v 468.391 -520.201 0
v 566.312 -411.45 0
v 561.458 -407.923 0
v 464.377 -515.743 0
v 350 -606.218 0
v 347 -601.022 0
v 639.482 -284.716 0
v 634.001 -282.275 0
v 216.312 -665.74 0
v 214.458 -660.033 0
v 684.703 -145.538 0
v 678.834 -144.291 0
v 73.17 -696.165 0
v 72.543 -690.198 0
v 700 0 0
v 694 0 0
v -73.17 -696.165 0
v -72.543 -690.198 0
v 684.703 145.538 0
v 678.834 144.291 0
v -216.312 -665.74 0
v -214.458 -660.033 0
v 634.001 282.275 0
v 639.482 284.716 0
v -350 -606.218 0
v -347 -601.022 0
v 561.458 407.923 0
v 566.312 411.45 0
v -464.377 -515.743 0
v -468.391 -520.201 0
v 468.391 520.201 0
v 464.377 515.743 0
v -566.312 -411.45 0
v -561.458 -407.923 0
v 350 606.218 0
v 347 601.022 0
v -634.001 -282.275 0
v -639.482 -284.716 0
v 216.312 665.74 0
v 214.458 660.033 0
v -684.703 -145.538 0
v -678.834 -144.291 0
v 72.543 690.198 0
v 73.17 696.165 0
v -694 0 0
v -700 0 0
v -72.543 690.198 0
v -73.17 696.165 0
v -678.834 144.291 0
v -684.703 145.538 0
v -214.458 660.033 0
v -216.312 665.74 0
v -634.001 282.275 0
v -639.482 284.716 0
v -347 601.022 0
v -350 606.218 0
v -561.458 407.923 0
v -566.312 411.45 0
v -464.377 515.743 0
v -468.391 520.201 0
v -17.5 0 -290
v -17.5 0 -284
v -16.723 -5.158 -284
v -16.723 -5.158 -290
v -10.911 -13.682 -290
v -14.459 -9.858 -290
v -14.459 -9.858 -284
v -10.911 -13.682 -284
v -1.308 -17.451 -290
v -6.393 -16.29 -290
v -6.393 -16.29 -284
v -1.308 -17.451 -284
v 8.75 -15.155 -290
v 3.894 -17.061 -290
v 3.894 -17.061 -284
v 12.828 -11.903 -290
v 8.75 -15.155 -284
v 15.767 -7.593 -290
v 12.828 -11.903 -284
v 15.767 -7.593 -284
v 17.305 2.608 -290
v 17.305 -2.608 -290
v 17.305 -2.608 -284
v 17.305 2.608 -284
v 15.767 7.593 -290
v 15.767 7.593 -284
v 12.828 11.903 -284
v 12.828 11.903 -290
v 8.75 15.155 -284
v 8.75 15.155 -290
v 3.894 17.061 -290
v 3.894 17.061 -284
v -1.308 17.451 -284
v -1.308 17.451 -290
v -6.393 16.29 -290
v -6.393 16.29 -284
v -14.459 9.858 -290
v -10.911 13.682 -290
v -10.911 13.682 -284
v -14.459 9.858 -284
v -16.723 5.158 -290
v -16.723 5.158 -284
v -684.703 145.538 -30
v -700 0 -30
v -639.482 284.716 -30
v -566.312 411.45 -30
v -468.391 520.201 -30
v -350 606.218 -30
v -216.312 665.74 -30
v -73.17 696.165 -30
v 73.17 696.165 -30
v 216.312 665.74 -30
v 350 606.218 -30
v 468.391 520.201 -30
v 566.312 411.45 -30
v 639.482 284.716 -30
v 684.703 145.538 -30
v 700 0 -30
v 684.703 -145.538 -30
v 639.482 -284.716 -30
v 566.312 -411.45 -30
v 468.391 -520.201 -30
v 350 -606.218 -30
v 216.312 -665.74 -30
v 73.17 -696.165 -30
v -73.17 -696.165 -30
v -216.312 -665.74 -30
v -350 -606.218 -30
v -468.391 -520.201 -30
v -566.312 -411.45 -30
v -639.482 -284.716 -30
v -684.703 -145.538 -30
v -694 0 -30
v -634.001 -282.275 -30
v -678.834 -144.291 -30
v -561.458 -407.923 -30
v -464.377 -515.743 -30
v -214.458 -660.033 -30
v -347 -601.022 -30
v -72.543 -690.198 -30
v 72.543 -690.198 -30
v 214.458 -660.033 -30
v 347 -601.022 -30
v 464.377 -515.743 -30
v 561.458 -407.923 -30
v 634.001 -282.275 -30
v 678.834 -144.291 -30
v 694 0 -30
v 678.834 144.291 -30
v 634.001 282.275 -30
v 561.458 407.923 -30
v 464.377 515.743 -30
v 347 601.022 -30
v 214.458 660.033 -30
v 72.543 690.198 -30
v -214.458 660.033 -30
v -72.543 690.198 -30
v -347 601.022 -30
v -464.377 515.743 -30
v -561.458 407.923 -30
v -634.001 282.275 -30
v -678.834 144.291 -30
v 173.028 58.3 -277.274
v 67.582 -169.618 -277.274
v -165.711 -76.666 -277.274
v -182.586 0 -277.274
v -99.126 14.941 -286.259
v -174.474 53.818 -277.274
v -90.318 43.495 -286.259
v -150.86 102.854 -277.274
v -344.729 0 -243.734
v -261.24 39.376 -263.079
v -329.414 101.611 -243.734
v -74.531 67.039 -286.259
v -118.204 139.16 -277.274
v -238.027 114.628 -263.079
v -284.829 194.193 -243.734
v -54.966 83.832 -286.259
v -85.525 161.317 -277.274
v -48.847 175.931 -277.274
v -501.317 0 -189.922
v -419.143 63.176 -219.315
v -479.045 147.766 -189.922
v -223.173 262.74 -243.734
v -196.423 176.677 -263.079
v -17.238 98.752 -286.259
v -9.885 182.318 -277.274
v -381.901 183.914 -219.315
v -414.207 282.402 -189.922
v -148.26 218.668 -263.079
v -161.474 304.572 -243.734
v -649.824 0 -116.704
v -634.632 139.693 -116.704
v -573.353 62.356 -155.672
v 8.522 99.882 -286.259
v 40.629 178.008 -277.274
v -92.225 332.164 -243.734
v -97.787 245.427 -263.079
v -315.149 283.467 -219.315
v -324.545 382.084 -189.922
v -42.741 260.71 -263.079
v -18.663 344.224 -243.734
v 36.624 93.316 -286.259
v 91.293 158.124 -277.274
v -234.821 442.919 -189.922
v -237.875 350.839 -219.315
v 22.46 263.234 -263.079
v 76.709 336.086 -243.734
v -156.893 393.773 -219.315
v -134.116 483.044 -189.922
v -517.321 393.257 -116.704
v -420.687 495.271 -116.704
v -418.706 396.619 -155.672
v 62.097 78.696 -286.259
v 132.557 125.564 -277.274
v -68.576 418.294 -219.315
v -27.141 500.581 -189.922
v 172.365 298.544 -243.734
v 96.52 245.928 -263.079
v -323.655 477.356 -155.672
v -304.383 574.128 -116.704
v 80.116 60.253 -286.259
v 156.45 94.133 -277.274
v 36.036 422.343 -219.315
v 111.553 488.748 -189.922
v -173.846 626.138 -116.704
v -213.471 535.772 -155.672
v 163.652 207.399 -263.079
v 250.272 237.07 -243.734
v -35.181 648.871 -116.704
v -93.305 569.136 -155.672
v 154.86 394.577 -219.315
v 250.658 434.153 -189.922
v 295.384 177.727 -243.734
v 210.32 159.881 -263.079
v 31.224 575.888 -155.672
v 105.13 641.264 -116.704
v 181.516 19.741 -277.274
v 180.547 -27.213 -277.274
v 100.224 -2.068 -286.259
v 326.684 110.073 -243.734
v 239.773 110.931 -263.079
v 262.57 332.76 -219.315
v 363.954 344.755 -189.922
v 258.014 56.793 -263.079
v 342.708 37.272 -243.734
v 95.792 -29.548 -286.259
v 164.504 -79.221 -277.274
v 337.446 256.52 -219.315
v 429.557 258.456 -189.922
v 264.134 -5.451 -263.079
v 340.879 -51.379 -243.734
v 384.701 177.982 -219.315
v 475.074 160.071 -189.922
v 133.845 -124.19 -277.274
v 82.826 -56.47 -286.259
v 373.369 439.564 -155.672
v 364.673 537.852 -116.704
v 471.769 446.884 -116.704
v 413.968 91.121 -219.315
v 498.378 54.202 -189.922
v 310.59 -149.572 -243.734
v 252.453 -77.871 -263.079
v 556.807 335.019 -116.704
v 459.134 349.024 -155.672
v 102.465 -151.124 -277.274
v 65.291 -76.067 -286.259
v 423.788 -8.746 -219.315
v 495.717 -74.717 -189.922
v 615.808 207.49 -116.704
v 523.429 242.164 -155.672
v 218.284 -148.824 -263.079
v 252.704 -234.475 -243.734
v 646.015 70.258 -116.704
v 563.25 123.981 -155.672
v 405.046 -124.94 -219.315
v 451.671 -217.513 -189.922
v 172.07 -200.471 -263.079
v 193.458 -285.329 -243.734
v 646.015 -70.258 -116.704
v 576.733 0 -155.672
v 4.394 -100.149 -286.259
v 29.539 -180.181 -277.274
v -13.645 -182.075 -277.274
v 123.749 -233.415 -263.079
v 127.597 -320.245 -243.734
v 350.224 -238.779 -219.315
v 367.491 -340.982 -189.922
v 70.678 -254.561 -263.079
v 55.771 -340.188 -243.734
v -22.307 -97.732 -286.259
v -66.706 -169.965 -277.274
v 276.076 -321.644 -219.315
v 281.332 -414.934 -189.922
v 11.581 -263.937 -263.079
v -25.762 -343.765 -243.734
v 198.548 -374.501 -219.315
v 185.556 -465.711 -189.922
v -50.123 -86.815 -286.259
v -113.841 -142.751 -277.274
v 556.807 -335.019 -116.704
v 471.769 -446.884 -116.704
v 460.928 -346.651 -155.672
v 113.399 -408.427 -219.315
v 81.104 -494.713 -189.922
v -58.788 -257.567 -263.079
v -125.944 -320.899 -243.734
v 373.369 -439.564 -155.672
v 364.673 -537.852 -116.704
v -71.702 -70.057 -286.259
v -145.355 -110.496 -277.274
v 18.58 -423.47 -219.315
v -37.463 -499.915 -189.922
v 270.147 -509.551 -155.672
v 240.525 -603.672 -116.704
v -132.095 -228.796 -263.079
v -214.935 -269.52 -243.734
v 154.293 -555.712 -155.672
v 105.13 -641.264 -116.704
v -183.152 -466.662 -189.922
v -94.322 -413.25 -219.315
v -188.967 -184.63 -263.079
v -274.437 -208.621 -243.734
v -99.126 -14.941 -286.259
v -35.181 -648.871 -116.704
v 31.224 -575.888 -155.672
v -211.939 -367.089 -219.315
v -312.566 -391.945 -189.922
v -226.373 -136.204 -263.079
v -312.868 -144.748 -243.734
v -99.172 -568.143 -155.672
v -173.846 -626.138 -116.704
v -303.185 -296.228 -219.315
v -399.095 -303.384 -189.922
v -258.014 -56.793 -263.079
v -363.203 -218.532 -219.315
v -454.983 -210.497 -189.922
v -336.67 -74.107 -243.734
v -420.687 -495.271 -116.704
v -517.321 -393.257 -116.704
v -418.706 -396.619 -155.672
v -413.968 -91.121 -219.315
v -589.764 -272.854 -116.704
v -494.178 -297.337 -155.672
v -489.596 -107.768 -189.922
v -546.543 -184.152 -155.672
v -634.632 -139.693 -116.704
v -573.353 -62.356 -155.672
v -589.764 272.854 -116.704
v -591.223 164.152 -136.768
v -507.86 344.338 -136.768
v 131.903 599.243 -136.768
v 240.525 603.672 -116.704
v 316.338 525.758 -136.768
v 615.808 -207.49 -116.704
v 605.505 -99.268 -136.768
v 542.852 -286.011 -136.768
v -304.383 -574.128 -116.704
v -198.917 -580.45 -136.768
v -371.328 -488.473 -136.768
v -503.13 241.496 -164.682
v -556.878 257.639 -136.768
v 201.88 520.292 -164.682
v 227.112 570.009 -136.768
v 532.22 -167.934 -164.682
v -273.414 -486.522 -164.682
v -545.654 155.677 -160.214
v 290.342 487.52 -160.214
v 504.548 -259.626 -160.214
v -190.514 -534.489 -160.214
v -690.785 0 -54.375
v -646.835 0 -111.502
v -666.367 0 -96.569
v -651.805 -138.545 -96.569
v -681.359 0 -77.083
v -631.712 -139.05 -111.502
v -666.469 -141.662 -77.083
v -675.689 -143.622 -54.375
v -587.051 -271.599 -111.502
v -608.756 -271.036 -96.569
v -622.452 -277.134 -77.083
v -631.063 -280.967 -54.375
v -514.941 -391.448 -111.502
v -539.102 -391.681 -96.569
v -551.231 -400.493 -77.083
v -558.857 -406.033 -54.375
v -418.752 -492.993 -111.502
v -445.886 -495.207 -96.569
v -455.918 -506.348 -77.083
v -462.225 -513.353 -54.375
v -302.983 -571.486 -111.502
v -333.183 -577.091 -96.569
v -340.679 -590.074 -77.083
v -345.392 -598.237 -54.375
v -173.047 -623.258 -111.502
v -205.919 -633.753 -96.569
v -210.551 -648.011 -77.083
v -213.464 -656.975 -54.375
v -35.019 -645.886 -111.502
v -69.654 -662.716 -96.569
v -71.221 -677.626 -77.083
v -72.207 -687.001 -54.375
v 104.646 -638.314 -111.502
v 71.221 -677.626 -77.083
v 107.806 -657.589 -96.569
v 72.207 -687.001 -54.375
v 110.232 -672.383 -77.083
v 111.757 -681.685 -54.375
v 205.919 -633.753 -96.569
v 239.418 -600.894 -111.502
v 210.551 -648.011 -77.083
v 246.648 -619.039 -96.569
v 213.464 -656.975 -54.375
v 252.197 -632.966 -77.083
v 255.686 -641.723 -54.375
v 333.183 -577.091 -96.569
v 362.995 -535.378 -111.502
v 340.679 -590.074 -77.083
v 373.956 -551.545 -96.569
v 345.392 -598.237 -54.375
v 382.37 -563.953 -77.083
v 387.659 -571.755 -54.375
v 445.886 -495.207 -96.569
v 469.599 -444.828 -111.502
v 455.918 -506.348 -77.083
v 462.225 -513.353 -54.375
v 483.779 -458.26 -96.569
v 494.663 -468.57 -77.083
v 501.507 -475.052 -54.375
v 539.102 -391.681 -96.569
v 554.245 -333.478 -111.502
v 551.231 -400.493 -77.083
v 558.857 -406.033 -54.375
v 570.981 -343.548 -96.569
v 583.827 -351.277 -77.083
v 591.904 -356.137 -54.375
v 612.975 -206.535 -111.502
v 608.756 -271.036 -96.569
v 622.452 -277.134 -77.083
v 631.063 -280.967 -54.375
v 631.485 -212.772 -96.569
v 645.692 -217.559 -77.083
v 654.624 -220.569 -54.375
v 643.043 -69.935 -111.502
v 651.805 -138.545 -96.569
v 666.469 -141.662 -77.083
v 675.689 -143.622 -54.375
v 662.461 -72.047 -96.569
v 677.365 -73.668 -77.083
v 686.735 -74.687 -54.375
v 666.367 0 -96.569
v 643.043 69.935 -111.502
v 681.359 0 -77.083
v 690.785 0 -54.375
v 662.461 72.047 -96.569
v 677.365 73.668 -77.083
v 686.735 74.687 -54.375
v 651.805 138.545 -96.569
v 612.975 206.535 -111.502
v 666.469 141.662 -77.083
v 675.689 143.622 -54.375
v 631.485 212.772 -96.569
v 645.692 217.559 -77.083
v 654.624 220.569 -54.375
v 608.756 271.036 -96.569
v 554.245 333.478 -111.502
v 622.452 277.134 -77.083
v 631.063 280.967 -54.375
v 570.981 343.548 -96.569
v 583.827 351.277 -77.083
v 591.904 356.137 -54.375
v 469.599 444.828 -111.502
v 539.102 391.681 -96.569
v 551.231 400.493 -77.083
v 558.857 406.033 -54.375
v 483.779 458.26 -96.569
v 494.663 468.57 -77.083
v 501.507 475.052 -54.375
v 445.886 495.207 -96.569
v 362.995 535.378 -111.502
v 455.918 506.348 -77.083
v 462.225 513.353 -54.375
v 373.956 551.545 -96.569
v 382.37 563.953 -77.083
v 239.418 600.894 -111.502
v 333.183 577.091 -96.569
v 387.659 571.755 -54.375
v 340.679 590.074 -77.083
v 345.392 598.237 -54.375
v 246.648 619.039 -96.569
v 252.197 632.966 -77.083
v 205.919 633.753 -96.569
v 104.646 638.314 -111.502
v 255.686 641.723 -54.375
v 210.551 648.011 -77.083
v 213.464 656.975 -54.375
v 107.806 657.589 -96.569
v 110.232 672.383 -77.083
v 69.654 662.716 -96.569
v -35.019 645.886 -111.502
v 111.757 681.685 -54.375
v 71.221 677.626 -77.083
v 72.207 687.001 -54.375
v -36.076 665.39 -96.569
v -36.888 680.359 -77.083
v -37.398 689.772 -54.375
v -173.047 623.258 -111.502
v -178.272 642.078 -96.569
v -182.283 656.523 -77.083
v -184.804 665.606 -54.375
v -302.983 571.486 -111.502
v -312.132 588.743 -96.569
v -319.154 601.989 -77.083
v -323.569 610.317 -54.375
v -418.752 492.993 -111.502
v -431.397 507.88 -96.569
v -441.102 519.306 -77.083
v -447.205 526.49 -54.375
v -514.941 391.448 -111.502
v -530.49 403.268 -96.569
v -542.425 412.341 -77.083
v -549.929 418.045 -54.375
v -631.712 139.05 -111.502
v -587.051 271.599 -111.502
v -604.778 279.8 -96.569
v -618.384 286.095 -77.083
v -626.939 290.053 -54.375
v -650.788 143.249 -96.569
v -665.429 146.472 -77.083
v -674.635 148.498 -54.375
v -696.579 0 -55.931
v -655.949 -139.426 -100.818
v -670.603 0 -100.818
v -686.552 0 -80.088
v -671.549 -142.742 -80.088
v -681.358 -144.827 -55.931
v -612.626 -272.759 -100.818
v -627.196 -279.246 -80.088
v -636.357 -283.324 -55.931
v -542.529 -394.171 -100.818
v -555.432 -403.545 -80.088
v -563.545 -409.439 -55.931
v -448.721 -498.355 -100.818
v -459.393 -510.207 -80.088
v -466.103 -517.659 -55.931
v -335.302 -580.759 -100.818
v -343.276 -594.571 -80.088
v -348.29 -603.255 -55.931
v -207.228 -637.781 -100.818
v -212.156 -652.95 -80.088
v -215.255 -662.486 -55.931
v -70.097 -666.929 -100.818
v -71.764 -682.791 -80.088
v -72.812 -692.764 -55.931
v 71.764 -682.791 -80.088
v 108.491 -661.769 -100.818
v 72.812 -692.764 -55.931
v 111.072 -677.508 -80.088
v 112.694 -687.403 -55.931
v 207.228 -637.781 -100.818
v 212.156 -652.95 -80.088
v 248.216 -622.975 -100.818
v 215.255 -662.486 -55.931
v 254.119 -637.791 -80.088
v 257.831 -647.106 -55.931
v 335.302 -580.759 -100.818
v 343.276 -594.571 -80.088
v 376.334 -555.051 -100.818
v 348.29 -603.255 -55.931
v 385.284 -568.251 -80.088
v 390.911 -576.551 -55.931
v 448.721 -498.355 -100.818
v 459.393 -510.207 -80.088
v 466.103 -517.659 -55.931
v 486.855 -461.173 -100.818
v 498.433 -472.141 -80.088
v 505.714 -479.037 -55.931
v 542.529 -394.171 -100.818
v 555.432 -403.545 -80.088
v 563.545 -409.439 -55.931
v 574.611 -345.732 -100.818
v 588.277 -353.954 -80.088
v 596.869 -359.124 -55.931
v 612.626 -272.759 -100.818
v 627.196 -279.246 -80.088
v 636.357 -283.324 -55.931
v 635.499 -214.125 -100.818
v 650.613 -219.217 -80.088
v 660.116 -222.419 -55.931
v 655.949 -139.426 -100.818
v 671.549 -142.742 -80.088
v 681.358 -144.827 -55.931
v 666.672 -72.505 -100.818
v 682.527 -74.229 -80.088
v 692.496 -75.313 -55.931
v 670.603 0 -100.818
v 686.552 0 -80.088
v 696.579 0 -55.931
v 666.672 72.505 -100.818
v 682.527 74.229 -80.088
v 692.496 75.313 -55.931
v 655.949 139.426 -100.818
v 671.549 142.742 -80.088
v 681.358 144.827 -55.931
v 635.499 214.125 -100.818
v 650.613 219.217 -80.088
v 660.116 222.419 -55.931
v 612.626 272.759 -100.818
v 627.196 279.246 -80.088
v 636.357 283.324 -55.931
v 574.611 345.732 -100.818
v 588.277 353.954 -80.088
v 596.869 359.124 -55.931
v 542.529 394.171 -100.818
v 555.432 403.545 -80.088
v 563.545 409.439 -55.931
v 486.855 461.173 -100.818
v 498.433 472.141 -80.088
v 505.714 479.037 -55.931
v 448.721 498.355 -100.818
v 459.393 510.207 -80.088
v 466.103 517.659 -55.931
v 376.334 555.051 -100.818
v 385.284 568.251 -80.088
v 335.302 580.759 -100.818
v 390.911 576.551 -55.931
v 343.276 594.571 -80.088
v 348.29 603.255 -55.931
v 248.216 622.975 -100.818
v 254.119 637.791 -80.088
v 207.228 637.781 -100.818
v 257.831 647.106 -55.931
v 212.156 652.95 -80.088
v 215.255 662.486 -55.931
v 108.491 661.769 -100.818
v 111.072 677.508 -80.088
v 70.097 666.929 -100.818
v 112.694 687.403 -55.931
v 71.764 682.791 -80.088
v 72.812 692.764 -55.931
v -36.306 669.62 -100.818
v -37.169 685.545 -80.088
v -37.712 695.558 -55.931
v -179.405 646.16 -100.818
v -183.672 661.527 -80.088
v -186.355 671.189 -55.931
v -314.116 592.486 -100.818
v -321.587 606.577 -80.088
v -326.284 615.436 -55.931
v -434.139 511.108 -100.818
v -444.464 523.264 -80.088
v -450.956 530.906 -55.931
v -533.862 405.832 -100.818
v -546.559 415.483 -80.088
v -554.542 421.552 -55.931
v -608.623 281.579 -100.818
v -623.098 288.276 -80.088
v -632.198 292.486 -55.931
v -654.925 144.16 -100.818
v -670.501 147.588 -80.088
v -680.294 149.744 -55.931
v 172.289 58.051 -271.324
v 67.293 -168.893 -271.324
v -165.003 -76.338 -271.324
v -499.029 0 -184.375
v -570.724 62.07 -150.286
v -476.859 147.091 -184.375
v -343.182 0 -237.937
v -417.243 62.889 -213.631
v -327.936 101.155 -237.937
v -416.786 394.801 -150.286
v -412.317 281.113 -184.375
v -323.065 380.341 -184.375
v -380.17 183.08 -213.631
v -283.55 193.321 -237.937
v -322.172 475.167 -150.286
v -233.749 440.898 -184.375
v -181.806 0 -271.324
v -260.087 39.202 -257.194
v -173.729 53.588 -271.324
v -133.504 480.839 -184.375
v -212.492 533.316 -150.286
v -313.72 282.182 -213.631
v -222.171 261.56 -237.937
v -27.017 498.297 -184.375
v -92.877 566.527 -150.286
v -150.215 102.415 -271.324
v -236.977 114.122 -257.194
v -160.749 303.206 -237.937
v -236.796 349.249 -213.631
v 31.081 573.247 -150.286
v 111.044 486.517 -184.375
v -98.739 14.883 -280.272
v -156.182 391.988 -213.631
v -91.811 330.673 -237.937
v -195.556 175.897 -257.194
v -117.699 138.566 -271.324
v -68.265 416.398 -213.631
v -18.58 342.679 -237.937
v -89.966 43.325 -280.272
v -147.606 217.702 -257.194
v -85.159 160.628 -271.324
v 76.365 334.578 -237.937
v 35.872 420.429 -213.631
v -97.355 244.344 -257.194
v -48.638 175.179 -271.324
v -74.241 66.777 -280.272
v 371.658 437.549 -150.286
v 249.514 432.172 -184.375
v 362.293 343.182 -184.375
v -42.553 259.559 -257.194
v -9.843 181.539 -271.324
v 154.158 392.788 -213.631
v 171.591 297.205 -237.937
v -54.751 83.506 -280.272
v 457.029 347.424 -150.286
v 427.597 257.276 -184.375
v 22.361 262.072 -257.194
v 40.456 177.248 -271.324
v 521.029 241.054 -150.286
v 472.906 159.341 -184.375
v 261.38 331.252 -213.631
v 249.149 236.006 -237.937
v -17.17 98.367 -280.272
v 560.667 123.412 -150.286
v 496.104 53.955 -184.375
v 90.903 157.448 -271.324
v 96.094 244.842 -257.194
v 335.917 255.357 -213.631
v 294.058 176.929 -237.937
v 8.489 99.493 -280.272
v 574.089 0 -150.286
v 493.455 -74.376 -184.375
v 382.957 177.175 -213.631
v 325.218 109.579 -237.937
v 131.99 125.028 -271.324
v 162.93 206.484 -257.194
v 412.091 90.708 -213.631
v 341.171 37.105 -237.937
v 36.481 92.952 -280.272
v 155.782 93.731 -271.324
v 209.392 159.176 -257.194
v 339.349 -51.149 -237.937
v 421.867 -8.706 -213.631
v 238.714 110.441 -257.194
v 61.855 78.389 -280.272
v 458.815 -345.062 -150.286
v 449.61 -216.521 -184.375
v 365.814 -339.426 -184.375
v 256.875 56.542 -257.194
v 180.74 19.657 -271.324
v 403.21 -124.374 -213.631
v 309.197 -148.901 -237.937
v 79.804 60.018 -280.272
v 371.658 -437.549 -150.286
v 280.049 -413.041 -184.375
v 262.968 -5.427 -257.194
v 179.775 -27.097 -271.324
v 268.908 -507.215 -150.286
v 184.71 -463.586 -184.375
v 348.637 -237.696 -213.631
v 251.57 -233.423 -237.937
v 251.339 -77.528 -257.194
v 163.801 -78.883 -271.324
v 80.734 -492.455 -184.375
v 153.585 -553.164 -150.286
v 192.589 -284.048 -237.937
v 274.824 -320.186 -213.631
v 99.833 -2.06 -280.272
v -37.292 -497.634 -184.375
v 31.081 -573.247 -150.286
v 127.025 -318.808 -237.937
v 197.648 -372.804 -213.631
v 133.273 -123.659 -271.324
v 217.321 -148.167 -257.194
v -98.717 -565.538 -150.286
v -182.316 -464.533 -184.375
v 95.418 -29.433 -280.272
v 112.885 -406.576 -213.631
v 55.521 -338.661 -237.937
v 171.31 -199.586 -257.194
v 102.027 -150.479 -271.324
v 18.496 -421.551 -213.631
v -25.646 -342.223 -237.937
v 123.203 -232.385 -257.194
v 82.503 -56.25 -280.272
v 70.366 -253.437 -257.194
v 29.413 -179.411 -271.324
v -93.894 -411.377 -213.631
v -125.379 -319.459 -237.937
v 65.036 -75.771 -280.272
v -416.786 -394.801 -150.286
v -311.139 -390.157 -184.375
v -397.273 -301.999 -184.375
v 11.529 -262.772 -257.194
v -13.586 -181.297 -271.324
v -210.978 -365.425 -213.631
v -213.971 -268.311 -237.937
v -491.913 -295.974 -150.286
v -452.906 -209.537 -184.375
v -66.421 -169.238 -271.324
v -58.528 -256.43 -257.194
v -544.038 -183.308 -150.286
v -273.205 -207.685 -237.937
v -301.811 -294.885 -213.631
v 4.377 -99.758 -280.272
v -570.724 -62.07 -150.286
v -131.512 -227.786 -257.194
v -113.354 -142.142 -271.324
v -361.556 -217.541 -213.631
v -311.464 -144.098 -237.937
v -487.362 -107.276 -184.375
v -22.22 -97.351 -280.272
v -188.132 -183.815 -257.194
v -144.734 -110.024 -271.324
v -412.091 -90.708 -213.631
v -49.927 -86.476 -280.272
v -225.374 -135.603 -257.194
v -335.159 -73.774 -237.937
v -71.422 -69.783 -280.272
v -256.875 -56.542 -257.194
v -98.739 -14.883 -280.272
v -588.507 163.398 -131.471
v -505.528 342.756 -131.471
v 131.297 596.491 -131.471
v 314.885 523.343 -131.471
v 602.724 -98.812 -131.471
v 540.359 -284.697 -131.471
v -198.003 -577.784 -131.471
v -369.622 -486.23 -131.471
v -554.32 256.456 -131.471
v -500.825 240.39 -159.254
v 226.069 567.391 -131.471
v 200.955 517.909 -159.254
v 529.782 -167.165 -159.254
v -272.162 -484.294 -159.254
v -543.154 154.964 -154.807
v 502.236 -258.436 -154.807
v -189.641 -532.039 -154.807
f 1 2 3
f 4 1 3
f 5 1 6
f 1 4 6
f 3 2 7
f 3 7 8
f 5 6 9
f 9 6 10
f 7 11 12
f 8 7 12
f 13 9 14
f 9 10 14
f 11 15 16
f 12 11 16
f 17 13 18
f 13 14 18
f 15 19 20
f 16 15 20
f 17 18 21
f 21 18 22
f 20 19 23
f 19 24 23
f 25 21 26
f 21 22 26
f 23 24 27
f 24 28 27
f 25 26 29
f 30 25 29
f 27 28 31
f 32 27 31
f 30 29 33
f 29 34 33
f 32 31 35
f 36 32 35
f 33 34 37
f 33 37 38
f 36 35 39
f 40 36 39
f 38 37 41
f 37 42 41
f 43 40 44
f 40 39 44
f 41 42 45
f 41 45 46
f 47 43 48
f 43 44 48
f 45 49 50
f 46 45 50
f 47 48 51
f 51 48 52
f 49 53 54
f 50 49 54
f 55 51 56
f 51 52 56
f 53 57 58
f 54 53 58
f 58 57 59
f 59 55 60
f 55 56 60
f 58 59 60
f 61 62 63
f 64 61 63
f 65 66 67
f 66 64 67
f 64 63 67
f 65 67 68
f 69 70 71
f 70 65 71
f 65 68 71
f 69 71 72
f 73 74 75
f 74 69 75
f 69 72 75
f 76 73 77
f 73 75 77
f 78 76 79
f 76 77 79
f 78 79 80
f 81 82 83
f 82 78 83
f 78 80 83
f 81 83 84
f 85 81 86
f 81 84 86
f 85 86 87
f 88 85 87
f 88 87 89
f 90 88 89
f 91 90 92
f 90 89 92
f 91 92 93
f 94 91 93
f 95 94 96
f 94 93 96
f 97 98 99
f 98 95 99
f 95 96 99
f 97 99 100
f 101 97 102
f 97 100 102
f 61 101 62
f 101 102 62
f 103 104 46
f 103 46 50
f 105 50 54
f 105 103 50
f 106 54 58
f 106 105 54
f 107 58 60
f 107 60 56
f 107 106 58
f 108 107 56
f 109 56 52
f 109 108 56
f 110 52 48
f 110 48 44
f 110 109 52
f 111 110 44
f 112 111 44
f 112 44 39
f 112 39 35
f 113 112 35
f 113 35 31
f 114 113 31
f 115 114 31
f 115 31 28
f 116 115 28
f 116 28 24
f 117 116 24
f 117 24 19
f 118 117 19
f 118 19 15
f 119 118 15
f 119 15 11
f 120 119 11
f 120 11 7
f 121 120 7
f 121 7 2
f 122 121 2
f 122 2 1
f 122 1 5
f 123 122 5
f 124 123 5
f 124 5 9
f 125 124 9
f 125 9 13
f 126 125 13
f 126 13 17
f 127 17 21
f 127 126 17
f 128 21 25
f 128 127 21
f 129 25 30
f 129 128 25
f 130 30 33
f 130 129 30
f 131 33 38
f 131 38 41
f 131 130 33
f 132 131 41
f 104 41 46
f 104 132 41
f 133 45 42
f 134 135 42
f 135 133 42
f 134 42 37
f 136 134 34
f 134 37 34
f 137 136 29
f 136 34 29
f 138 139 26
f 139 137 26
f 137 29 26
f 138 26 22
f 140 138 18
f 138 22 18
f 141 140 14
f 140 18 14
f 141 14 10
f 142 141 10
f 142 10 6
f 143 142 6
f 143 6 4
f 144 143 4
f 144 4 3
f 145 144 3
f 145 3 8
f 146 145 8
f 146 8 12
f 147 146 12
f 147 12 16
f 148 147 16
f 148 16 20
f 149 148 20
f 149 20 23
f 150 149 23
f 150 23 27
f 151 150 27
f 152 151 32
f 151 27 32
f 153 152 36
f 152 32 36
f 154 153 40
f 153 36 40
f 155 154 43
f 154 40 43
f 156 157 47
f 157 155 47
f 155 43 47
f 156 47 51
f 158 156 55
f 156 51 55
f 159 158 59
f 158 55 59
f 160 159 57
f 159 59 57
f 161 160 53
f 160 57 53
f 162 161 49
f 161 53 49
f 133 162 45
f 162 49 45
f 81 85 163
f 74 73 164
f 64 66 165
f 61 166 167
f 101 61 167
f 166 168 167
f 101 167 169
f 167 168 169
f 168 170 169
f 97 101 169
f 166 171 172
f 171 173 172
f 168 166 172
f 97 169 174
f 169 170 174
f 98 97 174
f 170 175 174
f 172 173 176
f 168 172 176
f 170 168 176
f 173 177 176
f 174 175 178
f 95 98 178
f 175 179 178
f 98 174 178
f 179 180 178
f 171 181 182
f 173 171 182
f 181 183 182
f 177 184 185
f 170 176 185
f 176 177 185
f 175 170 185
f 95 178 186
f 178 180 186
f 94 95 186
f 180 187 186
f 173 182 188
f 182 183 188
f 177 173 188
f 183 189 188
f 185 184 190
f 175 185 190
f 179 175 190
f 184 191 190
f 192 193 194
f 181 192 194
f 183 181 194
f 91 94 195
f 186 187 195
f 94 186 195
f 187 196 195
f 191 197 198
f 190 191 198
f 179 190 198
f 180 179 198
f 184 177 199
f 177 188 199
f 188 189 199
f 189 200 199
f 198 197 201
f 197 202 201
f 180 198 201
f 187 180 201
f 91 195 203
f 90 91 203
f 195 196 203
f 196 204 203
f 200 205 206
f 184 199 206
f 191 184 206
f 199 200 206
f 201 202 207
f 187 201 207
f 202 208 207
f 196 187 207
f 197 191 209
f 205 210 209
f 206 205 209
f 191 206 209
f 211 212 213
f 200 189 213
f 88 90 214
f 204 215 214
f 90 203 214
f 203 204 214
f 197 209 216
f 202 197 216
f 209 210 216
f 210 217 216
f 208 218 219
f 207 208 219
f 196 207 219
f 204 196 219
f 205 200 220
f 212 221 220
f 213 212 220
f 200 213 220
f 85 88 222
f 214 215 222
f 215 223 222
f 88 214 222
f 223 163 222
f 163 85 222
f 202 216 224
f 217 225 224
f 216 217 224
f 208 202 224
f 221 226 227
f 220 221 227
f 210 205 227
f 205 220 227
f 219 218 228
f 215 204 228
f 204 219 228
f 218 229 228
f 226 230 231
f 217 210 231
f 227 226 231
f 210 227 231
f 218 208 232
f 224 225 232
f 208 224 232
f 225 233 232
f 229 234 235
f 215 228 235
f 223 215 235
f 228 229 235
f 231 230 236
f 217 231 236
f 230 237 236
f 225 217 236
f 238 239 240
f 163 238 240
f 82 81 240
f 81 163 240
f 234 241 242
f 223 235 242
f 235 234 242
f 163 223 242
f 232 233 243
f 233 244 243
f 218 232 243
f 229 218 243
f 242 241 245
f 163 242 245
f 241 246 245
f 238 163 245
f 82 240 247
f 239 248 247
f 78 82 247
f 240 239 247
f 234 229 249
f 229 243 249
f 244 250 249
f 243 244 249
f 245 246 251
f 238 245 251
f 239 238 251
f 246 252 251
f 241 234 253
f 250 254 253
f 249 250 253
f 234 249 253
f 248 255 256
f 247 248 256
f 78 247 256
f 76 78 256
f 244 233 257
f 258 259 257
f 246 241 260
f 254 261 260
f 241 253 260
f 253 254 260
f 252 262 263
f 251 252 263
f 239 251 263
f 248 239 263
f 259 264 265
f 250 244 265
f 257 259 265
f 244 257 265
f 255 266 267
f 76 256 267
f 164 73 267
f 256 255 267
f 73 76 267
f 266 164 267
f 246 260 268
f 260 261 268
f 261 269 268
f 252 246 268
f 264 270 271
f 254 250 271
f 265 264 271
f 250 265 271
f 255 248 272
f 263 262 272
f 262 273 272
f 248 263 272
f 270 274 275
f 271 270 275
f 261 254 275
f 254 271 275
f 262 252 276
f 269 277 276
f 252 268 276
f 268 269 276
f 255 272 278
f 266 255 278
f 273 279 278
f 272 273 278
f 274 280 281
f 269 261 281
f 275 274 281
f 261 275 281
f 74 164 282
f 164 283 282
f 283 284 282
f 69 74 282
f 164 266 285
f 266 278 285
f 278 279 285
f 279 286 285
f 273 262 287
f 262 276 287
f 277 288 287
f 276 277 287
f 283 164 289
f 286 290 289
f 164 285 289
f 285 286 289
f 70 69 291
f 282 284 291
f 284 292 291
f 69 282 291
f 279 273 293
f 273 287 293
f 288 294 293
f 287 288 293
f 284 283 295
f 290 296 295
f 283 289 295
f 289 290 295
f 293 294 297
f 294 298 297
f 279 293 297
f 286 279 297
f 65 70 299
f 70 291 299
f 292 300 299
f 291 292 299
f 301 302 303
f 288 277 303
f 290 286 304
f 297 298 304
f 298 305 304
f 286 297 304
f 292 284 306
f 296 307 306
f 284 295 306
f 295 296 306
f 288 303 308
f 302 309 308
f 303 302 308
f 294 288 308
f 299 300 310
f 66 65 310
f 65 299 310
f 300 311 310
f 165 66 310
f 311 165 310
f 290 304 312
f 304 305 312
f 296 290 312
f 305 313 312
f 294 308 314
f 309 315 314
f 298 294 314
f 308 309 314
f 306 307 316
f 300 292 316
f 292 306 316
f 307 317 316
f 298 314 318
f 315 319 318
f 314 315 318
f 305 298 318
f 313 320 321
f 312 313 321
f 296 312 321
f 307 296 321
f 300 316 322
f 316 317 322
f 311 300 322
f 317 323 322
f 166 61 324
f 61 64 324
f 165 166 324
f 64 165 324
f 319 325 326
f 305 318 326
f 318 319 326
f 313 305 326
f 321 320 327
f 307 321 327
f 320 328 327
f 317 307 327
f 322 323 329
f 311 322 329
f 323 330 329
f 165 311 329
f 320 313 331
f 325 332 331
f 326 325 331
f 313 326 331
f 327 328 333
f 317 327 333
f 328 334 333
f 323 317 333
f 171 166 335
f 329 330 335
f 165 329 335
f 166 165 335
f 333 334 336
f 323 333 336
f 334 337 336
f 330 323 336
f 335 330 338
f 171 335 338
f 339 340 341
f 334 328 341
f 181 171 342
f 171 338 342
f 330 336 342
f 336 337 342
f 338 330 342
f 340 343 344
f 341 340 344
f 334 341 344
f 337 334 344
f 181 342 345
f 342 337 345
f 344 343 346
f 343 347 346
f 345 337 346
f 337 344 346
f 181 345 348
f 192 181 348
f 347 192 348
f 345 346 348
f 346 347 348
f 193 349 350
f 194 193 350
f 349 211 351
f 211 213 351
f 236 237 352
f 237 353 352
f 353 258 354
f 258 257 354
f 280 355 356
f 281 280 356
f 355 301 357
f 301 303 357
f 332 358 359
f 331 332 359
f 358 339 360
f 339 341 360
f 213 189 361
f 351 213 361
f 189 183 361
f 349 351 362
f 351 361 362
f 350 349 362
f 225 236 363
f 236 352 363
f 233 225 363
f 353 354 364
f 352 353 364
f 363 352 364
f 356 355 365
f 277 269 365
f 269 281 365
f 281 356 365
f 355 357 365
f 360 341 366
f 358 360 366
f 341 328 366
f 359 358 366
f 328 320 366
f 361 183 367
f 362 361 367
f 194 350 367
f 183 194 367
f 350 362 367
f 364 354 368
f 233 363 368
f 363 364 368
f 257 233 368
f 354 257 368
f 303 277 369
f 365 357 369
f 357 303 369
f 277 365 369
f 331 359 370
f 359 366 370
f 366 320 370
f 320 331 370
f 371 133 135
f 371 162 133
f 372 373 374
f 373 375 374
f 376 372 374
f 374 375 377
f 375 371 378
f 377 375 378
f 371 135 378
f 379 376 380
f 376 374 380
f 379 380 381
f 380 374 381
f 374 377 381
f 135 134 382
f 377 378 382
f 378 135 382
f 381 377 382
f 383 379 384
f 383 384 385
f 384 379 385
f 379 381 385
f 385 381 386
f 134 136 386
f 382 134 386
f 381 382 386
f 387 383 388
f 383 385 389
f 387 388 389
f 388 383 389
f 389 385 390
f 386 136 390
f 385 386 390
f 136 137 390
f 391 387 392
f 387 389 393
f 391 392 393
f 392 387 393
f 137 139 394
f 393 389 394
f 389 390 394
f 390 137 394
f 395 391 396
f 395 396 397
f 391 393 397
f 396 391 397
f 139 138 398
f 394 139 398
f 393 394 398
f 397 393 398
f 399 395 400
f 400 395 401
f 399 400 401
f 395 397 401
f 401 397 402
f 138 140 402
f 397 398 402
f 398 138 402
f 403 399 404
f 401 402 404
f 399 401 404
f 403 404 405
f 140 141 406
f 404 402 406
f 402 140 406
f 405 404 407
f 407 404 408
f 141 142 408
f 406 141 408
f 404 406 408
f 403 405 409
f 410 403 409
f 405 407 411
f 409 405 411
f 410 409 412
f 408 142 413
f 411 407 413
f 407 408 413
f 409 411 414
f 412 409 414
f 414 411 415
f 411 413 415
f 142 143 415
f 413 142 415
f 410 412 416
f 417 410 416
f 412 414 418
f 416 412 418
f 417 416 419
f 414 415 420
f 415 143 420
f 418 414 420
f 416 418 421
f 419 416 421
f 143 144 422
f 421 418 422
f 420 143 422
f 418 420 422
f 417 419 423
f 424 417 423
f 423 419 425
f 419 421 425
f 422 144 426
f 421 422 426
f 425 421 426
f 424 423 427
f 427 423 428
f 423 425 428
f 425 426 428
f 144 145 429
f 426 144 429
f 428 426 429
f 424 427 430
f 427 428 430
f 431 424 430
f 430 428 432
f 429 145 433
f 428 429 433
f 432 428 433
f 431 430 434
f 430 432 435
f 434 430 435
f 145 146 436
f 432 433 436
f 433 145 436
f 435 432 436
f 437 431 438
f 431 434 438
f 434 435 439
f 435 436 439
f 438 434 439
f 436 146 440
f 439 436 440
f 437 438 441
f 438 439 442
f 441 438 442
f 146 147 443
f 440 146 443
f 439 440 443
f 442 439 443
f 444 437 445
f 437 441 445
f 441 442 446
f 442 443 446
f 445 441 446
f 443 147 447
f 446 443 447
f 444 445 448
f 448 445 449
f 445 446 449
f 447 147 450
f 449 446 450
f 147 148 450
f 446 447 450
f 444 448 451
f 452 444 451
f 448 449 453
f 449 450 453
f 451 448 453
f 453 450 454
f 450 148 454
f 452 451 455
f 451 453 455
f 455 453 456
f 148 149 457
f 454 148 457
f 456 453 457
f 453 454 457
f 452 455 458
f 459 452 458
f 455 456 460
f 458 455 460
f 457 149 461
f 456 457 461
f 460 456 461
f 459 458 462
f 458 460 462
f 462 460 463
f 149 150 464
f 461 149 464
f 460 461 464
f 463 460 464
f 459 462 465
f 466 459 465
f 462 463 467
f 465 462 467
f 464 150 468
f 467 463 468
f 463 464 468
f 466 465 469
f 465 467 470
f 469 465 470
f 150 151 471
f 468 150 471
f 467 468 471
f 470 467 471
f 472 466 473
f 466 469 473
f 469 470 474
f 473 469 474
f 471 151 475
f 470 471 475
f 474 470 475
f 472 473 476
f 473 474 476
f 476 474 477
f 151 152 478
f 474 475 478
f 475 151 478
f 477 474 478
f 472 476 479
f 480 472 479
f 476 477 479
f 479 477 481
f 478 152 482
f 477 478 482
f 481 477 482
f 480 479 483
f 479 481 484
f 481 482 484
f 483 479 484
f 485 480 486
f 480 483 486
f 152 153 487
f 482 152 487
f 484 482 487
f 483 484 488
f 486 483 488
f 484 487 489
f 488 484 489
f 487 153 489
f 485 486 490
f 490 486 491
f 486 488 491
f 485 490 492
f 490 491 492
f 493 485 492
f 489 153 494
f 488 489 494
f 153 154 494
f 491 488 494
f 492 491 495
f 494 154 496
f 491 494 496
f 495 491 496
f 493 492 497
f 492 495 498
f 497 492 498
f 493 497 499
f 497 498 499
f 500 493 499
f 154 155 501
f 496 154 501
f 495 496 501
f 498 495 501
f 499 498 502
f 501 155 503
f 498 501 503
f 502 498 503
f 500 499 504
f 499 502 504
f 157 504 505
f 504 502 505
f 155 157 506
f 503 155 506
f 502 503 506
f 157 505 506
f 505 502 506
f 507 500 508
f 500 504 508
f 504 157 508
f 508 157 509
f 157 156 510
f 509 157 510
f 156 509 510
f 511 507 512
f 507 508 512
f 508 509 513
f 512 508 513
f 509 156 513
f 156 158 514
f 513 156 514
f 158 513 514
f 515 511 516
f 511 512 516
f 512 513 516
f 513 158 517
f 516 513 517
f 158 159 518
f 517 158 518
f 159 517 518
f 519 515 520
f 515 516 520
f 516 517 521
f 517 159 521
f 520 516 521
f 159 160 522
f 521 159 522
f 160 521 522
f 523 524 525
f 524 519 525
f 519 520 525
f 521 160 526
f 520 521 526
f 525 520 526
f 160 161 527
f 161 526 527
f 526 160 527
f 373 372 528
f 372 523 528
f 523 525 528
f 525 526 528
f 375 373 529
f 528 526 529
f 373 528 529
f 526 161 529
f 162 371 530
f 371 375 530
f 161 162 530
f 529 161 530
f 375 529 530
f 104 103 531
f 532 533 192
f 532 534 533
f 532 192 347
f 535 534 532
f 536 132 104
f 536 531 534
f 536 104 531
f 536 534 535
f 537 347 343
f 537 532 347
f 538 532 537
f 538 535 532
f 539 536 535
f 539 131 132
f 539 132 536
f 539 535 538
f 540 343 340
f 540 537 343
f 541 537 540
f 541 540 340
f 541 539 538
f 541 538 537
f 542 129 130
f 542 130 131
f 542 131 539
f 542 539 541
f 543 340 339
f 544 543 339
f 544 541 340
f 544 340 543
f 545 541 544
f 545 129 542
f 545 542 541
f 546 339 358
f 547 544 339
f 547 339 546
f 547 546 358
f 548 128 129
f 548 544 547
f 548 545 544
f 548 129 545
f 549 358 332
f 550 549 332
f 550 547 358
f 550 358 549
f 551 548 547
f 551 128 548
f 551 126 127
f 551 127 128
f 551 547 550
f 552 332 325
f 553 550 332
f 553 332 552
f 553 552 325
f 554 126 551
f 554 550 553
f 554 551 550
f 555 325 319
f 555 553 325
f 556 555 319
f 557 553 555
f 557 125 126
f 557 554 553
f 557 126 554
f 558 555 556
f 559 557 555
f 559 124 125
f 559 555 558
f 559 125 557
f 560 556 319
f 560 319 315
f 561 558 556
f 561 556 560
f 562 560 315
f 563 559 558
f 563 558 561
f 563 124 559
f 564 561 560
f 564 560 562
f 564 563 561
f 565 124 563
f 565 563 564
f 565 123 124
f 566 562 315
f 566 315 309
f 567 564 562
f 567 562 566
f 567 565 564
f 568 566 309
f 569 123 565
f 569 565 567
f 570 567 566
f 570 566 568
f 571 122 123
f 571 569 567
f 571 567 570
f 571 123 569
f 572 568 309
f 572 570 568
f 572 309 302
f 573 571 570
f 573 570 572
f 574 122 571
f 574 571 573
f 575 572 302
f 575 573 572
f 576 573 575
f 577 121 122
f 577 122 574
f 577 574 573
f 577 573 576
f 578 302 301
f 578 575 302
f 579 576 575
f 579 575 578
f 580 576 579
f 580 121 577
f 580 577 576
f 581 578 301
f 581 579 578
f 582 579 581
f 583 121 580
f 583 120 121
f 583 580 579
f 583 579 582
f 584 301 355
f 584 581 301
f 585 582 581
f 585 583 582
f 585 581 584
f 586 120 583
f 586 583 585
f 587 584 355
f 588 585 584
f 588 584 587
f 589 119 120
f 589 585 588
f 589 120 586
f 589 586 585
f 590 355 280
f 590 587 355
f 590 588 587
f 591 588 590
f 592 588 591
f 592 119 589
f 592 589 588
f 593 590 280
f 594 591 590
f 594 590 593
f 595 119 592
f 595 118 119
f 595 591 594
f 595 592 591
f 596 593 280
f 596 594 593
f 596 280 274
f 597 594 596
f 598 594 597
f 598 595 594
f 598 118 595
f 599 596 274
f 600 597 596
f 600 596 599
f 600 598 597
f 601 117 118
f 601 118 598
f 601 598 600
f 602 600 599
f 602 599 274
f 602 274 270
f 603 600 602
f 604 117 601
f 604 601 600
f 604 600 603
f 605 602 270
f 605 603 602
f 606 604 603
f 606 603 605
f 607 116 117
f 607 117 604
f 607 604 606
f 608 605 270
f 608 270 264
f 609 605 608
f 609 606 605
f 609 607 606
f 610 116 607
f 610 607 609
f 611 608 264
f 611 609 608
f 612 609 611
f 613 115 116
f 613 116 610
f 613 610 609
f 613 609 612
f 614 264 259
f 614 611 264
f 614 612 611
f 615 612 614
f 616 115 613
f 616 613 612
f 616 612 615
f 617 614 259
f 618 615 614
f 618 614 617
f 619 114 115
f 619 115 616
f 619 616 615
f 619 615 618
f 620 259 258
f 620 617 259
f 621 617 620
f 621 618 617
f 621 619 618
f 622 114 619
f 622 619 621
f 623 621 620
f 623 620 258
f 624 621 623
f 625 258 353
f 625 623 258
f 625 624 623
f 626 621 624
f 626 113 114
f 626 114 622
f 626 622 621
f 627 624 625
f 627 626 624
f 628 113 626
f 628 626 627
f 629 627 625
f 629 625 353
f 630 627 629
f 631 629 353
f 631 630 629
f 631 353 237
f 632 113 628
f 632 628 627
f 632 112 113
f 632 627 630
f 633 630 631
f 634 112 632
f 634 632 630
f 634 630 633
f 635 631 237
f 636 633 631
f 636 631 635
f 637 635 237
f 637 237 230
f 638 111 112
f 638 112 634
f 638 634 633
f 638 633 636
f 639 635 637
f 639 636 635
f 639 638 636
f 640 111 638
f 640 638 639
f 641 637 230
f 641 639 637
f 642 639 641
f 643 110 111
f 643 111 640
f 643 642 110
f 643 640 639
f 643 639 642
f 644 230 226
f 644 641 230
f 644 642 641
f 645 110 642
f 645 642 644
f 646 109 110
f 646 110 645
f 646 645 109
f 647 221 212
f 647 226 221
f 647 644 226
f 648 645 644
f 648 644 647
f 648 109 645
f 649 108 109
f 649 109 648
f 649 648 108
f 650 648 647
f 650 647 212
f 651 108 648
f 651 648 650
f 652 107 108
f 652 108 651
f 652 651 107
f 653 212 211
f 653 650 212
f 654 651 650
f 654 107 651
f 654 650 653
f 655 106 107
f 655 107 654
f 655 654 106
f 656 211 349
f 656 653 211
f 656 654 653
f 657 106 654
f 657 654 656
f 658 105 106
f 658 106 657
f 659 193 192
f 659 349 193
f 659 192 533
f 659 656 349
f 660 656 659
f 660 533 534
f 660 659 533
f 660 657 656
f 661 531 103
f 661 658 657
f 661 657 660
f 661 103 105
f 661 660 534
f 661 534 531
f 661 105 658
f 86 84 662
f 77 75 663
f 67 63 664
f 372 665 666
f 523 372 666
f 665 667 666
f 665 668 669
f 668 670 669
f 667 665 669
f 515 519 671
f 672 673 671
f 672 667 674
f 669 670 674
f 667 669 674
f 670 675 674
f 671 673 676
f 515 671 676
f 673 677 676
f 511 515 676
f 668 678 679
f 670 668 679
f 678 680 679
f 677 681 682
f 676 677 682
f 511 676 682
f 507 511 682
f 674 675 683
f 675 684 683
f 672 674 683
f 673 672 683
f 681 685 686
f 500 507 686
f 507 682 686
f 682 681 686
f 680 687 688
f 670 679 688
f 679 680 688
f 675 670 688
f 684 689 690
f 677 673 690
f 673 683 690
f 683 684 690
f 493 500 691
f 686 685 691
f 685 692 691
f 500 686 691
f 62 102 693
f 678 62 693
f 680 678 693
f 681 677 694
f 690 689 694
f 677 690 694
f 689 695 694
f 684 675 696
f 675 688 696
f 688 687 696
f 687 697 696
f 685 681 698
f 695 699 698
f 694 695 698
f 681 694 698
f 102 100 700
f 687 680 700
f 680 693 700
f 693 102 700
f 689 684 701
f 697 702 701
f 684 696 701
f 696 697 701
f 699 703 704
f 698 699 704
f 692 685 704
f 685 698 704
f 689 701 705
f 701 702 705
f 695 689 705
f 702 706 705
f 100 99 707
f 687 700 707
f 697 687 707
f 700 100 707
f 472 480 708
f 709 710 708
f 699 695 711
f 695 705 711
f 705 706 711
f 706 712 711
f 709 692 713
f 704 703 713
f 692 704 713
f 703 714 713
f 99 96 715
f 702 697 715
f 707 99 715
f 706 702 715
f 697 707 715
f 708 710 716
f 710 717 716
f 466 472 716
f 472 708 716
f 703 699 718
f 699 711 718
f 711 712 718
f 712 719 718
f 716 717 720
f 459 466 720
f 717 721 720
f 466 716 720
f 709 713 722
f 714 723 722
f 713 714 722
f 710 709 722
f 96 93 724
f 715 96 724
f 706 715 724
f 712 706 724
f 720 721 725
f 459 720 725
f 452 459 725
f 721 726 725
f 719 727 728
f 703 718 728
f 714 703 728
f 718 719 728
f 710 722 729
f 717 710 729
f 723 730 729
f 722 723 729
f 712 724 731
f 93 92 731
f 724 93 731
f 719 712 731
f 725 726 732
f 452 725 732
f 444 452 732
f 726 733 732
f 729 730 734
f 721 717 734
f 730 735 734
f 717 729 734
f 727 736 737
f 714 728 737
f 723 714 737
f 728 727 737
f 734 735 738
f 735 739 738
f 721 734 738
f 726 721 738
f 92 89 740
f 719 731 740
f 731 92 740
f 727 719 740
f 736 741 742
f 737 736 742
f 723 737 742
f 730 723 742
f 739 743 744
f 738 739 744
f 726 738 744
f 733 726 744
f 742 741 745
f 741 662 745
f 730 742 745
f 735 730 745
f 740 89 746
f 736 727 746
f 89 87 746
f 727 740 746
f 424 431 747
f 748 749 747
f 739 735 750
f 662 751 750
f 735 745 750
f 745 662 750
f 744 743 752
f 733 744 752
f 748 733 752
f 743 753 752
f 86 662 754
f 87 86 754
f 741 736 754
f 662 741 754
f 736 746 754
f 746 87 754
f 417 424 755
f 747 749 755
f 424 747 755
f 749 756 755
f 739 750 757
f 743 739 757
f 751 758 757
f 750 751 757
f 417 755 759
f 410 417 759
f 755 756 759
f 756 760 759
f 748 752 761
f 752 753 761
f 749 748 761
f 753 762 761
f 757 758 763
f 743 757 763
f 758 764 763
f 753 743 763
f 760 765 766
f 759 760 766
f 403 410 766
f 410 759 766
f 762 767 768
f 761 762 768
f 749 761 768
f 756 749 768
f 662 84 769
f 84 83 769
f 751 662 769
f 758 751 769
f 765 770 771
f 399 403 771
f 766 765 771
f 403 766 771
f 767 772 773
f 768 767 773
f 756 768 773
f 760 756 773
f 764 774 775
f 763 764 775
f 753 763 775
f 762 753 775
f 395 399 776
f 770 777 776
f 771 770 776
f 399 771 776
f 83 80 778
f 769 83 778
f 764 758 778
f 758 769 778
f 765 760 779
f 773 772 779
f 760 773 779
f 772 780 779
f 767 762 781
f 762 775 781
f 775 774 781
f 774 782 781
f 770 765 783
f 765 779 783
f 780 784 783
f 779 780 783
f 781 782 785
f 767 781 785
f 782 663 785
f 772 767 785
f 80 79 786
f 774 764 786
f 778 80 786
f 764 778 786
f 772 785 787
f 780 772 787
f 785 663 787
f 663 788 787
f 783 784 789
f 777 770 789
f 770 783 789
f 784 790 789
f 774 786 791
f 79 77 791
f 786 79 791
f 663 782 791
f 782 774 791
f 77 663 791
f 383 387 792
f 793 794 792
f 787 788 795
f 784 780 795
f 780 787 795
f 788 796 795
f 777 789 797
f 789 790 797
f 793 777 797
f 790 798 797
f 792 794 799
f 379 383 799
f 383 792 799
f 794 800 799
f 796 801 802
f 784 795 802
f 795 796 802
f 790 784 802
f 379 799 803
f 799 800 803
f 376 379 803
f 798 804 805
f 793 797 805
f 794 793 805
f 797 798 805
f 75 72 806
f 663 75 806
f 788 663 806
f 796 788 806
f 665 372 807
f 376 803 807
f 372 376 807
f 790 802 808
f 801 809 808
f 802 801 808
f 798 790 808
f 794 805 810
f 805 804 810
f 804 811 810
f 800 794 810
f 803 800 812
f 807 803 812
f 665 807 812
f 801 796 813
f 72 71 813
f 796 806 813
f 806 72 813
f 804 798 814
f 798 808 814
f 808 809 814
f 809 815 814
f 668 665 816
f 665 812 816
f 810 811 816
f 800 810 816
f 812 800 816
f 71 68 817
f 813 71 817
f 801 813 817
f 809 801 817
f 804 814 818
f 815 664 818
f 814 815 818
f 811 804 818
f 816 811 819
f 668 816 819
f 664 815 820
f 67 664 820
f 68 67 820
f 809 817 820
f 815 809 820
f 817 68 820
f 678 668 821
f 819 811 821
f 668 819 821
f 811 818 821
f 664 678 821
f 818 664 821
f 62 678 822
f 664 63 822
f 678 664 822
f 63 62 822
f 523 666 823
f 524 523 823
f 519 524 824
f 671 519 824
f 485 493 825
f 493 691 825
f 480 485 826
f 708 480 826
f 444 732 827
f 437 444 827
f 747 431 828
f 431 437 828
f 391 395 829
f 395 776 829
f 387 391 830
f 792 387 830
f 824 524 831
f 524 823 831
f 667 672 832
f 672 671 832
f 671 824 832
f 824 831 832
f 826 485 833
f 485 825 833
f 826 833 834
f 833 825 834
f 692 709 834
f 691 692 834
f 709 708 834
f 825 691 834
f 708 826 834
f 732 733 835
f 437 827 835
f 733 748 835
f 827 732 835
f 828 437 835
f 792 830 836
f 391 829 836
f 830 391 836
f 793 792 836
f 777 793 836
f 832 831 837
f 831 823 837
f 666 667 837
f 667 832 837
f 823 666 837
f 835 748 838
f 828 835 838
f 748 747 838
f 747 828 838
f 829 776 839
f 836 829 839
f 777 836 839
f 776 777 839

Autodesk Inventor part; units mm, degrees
ref_plane "YZ Plane" through (0, 0, 0) normal (1, 0, 0) x (0, 1, 0)
ref_plane "XZ Plane" through (0, 0, 0) normal (0, 1, 0) x (-1, 0, 0)
ref_plane "XY Plane" through (0, 0, 0) normal (0, 0, 1) x (1, 0, 0)
sketch "Sketch1" plane through (0, 0, 0) normal (0, 1, 0) x (-1, 0, 0)
  line L0 (700, 0) -> (700, -30)
  arc A0 (649.8242, -116.7038) -> (700, -30) centre (600, -30) ccw
  arc A1 (17.5, -290) -> (649.8242, -116.7038) centre (0, 1014.1164) ccw
  line L1 (0, 290) -> (0, -290)
  arc A2 (17.5, -283.9995) -> (646.8348, -111.5016) centre (0, 1014.1164) ccw
  arc A3 (646.8348, -111.5016) -> (694, -30) centre (600, -30) ccw
  line L2 (694, -30) -> (694, 0)
  line L3 (694, 0) -> (700, 0)
  line L4 (0, -290) -> (17.5, -290)
  line L5 (0, -283.9995) -> (17.5, -283.9995)
  line L6 (17.5, -290) -> (17.5, -283.9995)
  point P0 (0, 0)
  point P1 (0, 0)
  point P2 (0, -163.7009)
  point P3 (0, -169.7009)
  dimension "d0" = 100
  dimension "d1" = 30
  dimension "d3" = 1304.2338
  dimension "d6" = 6
  dimension "d13" = 35
  dimension "d14" = 1400
  dimension "d15" = 290
revolve "Revolution1" add sketch "Sketch1" angle 360 about axis through (0, 0, 290) along (0, 0, -1) contours L0 A0 A1 L6 A2 A3 L2 L3
equation "\"d0\" = tech_dishhead_small_rad"
equation "\"d1\" = tech_dishhead_edge_hight"
equation "\"d13\" = tech_dishhead_bottom_hole"
equation "\"d14\" = MAIN_filter_diam"
equation "\"tech_dishhead_small_rad\" = 100"
equation "\"tech_dishhead_edge_hight\" = 30"
equation "\"tech_dishhead_bottom_hole\" = 35"
equation "\"MAIN_filter_diam\" = 1400"
properties part number "APN 1408 dished head" material "Steel"
